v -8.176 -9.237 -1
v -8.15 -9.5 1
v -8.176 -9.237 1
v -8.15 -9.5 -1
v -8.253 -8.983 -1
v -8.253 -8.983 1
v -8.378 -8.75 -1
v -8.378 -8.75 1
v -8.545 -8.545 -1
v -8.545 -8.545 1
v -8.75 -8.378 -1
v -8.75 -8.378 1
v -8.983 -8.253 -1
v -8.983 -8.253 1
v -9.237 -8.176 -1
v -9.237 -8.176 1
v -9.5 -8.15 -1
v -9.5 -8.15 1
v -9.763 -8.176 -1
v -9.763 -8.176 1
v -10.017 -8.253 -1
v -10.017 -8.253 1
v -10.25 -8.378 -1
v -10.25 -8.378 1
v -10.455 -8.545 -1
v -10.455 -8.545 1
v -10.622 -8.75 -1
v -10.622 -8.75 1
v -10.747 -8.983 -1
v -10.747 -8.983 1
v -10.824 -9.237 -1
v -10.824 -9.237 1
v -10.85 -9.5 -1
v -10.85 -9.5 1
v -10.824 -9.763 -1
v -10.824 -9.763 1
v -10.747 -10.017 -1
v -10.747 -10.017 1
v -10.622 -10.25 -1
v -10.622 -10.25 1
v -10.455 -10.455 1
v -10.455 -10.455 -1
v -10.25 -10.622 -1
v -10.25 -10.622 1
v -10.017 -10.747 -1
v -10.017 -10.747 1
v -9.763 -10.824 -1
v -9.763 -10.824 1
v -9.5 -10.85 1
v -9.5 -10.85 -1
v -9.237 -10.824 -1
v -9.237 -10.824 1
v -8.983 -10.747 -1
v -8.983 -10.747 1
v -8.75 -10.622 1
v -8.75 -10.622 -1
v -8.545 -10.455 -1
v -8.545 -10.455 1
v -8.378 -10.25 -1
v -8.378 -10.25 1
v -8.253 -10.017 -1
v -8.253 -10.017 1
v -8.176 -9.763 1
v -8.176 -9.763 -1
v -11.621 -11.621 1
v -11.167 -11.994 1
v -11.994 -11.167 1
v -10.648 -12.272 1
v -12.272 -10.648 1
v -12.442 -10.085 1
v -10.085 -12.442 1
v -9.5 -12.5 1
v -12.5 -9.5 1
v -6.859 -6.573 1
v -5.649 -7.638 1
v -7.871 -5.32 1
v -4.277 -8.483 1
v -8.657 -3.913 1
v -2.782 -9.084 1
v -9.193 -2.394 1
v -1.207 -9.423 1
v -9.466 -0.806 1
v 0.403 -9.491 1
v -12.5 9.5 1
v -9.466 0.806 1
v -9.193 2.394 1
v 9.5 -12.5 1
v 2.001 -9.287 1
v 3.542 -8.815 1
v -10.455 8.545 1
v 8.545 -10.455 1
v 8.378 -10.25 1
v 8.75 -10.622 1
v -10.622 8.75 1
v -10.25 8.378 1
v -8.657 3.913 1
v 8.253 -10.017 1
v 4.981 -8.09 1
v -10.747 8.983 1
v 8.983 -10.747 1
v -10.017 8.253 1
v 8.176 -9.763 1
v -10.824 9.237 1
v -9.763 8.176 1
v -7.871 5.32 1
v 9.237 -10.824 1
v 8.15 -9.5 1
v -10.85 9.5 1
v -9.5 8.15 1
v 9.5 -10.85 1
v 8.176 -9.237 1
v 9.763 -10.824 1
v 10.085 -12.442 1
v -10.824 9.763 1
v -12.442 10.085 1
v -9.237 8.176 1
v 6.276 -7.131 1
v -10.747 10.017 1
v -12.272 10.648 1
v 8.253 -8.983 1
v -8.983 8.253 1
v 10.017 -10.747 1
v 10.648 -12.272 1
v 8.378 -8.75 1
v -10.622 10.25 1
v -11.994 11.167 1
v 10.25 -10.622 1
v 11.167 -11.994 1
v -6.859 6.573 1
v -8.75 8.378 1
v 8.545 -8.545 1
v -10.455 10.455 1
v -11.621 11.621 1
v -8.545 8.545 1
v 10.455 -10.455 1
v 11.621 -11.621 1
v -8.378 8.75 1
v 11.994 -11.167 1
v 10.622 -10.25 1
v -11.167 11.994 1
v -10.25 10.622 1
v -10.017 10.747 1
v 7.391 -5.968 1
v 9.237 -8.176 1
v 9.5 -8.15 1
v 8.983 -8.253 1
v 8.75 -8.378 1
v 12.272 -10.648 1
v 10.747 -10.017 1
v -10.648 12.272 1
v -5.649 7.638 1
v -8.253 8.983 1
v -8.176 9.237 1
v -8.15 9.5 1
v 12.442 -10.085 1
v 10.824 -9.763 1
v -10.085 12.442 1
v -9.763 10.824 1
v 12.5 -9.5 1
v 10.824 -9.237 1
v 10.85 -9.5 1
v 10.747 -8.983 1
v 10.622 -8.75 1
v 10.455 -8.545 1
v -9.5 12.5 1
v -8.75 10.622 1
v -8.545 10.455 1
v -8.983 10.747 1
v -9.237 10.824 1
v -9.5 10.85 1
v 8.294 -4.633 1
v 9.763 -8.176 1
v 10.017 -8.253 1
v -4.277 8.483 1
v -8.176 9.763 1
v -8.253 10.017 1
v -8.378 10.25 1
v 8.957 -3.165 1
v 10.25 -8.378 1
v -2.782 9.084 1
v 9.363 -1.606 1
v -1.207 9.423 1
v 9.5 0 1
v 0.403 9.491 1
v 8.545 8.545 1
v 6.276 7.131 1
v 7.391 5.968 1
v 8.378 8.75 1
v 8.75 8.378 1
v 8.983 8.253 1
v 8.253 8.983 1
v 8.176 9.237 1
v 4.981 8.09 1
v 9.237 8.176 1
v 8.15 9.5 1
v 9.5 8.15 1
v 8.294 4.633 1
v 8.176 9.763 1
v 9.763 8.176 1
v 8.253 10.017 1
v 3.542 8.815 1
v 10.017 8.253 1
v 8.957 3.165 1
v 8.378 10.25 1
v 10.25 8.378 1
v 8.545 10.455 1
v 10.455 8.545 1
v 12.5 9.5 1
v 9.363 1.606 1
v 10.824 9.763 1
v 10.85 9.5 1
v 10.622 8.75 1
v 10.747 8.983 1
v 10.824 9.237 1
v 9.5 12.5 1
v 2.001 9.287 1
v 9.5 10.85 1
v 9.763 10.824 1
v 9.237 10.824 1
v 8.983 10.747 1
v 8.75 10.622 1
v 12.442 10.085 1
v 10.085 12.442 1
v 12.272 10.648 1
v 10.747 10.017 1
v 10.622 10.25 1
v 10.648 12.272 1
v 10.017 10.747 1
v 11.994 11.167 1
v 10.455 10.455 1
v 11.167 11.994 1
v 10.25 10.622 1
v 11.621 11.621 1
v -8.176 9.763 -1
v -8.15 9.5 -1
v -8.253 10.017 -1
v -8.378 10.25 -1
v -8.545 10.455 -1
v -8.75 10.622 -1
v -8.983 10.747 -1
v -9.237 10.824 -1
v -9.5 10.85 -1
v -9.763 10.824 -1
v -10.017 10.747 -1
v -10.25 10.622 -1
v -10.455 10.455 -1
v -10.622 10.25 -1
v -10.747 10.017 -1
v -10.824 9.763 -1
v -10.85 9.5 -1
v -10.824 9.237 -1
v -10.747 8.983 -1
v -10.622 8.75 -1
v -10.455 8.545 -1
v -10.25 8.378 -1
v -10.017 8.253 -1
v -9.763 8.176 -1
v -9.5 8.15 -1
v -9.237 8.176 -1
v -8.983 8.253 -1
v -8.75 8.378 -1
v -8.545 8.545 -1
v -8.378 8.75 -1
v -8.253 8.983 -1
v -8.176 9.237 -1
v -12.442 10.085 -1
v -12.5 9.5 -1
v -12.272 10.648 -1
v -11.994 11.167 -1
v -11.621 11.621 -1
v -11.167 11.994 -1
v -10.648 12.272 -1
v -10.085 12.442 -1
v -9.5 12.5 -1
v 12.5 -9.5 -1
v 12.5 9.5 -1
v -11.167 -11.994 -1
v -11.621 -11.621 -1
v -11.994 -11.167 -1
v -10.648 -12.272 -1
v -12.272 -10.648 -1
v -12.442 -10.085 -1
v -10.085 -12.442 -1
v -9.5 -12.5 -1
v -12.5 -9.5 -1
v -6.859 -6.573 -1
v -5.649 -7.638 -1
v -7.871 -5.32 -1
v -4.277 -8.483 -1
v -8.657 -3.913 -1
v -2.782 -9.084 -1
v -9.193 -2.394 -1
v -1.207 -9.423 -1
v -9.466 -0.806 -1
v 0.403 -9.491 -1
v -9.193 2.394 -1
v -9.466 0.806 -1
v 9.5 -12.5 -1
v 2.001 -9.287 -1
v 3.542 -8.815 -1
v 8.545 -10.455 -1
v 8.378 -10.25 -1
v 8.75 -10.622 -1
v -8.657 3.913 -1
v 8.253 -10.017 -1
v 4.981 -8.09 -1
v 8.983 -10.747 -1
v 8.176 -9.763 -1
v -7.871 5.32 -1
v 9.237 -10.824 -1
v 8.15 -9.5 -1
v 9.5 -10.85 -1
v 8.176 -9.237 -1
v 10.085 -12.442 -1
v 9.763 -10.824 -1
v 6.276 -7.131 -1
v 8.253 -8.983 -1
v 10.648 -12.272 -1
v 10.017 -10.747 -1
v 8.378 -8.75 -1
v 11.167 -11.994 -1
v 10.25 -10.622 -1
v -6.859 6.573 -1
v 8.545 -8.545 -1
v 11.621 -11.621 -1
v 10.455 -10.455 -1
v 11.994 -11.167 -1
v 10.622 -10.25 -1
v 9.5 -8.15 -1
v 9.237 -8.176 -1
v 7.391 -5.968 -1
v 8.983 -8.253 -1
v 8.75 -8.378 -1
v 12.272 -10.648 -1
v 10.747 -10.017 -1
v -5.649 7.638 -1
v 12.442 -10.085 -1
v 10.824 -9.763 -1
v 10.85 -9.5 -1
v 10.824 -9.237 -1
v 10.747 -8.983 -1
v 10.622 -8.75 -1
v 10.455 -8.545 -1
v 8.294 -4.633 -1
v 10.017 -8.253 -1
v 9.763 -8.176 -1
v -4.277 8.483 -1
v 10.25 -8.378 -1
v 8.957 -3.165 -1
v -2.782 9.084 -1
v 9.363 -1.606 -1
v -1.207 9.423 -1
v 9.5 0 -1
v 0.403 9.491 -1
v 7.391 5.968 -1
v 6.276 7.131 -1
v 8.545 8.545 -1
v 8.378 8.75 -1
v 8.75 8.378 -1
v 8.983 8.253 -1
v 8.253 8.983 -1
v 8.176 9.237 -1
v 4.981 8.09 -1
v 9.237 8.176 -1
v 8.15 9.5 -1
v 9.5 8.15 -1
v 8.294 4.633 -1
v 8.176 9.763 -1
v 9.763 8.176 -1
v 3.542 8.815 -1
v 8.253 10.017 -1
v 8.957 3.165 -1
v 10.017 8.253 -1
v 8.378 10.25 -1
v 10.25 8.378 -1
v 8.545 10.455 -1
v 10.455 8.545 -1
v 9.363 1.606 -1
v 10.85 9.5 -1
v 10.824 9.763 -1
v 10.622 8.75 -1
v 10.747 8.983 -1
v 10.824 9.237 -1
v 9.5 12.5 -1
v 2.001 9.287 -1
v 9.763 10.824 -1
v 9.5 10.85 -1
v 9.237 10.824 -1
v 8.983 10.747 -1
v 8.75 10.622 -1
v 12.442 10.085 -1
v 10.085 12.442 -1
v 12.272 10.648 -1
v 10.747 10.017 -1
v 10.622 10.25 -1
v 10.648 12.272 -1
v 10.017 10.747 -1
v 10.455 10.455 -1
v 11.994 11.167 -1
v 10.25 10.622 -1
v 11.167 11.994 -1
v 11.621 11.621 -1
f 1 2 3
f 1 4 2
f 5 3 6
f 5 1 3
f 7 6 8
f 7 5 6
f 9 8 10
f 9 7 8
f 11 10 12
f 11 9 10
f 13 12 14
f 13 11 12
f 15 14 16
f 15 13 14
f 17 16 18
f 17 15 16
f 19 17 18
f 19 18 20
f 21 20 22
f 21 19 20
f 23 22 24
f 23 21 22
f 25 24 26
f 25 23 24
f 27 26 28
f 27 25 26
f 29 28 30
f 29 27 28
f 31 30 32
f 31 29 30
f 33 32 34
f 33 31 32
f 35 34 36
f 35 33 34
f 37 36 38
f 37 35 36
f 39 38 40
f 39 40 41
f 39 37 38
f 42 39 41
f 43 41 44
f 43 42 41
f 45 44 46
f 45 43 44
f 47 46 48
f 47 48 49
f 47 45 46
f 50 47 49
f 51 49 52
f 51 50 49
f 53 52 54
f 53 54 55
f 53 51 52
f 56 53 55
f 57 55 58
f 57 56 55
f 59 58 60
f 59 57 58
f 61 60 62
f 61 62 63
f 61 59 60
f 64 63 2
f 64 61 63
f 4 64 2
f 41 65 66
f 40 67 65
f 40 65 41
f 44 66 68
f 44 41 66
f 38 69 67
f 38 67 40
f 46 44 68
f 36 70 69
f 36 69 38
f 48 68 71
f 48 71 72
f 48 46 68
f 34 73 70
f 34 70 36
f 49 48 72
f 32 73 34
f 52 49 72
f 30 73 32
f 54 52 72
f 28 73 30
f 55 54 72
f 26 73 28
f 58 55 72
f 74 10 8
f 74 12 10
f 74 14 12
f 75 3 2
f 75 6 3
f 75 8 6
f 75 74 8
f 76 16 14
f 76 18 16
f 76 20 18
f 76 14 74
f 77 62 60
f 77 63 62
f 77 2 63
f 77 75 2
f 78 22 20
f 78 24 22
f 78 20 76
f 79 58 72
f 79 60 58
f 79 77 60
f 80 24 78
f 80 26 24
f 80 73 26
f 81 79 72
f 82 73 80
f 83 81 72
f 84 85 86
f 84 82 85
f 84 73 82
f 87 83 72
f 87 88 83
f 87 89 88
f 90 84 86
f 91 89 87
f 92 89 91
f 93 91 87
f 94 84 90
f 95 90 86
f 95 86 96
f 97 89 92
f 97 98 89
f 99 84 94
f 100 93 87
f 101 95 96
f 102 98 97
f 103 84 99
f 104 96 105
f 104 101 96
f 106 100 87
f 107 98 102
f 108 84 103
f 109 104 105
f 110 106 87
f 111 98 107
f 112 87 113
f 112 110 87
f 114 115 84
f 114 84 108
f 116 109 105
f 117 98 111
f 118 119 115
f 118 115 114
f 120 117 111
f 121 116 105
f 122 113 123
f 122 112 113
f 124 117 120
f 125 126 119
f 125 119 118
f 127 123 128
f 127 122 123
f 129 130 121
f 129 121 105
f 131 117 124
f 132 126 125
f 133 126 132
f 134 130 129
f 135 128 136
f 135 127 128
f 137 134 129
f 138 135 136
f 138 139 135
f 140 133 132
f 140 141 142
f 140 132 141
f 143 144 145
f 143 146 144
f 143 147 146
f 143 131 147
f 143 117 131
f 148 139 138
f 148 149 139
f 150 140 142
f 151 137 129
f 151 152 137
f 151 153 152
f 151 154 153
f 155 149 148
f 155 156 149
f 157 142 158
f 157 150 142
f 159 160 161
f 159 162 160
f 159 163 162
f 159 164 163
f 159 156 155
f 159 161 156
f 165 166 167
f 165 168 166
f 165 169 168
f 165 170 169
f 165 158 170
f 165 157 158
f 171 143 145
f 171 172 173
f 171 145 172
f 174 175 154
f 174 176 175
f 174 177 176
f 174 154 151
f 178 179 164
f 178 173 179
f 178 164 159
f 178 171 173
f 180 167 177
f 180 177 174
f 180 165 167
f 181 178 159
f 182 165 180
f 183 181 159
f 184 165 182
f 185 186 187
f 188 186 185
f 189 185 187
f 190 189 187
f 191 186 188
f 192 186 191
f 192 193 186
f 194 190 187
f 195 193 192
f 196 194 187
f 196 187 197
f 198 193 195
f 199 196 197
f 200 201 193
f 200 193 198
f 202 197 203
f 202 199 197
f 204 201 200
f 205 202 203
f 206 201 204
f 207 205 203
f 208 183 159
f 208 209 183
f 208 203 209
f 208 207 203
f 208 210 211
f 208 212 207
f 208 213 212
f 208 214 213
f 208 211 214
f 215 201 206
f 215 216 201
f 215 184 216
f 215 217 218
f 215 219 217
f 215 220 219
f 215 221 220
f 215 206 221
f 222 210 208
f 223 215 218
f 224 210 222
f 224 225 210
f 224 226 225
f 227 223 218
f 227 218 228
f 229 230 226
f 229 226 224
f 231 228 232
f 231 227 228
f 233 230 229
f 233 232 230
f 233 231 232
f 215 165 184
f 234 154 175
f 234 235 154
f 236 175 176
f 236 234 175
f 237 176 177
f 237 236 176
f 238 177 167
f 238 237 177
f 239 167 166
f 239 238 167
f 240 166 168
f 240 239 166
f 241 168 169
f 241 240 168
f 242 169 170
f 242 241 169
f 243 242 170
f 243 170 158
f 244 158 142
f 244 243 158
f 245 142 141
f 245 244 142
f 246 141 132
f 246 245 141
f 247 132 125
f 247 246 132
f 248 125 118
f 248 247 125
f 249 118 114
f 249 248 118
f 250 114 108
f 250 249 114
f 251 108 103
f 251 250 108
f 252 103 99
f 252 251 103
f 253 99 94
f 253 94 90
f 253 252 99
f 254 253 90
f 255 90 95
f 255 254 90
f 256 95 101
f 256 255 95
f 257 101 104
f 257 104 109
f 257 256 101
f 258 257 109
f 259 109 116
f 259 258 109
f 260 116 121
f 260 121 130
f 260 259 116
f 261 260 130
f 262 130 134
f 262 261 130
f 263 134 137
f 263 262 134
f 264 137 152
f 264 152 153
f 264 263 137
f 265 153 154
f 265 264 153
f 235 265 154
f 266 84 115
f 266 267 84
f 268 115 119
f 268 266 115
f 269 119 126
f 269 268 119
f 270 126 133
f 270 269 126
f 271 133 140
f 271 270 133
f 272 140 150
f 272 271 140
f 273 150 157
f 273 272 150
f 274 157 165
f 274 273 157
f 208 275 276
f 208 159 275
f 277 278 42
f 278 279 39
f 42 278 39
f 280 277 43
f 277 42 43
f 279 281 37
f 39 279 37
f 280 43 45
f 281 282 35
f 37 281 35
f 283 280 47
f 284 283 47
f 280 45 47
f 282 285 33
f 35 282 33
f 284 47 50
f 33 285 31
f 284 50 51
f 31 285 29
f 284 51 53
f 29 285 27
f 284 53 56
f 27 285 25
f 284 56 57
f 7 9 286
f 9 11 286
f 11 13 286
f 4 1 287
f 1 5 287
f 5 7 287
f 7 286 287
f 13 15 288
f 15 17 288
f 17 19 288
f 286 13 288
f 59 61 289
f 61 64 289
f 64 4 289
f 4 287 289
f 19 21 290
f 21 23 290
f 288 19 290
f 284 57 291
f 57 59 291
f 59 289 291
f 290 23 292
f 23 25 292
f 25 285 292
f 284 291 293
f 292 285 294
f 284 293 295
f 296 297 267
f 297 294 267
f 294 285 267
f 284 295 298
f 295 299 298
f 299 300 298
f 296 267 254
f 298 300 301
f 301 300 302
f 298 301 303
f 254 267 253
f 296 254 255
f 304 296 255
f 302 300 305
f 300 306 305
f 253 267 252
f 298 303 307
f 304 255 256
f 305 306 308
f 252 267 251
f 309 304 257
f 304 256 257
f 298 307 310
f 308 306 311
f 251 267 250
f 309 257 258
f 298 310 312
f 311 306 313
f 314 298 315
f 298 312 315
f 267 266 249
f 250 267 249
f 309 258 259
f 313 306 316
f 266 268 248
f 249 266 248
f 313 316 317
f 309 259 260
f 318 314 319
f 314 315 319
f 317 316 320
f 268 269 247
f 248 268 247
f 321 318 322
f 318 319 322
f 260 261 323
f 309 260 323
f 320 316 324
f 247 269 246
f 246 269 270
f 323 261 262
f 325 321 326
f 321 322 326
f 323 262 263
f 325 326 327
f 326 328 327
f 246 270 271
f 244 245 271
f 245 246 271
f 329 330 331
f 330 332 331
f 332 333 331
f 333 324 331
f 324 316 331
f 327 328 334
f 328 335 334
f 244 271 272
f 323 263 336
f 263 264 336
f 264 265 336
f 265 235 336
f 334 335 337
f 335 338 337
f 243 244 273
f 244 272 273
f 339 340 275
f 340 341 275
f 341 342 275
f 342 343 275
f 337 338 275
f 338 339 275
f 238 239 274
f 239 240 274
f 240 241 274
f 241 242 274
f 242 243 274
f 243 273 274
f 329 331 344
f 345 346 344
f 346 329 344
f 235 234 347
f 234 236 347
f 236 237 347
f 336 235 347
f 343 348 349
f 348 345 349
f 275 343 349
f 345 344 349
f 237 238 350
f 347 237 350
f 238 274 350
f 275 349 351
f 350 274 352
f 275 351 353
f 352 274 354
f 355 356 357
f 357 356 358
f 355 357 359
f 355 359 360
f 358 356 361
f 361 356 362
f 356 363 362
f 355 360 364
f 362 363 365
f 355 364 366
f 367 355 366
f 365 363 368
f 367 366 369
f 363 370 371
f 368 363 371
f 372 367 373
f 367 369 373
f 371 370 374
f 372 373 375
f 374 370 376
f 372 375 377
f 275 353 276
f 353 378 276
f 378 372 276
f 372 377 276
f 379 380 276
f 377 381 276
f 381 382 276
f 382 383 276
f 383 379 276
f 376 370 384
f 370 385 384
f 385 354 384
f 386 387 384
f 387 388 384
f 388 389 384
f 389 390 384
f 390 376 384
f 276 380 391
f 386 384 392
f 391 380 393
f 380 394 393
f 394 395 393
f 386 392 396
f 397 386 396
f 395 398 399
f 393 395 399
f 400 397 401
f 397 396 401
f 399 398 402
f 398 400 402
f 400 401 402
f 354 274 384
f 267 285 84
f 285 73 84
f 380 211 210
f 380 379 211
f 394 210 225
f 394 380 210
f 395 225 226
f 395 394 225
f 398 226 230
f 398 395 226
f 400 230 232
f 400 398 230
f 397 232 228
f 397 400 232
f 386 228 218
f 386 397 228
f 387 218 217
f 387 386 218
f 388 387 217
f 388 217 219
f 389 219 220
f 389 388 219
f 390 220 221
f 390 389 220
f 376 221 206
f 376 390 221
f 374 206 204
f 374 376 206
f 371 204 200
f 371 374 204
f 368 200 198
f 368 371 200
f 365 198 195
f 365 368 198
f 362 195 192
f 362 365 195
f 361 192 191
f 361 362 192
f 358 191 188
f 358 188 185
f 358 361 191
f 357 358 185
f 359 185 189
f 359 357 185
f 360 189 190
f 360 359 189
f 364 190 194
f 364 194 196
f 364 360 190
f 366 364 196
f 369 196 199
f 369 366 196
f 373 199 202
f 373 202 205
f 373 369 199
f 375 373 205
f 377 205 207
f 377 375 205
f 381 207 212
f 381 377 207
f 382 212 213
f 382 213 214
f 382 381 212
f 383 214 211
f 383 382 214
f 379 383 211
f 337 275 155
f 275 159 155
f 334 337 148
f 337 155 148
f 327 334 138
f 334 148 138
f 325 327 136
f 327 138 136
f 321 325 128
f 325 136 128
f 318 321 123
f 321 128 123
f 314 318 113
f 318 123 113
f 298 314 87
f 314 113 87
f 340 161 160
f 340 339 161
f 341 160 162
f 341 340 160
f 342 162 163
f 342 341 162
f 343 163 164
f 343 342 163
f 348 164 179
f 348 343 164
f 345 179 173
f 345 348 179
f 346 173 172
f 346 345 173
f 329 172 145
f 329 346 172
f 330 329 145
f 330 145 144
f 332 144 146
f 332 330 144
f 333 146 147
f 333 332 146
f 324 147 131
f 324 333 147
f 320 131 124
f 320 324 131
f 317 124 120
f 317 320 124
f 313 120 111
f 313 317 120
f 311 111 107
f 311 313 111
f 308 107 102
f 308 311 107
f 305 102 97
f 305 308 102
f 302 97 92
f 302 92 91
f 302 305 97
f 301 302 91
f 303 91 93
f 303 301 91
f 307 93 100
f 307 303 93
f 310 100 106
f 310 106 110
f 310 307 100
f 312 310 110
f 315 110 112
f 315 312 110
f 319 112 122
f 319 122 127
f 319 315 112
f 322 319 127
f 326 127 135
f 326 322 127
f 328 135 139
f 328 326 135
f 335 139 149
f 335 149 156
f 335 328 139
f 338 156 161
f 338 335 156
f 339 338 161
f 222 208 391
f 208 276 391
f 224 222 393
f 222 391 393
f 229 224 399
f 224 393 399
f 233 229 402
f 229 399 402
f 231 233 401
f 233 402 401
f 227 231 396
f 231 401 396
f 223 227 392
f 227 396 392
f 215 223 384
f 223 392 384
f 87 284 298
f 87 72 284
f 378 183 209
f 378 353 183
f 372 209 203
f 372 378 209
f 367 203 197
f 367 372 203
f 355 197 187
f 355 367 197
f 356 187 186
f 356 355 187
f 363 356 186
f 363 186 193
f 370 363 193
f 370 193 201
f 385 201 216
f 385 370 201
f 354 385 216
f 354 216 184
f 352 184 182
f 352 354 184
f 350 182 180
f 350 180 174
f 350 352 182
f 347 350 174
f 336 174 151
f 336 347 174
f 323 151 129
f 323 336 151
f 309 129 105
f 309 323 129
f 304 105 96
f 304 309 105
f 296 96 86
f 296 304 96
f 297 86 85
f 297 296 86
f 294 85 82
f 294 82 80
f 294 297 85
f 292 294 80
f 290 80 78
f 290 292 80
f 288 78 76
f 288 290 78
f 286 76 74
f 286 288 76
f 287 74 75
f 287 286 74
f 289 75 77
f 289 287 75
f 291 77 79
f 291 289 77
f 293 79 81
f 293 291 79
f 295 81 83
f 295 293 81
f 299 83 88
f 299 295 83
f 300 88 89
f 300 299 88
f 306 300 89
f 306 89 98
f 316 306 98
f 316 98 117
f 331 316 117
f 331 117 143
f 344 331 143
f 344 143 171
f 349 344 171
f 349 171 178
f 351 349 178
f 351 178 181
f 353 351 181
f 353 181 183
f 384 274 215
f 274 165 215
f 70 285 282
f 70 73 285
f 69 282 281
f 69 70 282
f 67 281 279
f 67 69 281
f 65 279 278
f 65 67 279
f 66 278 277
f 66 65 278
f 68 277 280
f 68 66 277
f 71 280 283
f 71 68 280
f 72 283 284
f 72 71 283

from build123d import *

# Parameters (mm, degrees)
SKETCH1_W           = 25
SKETCH1_H           = 25
SKETCH1_R           = 1.35
SKETCH1_R_2         = 9.5
BOSS_EXTRUDE1_DEPTH = 1
FILLET1_R           = 3


with BuildPart() as part:
    # Sketch1 → Boss-Extrude1 (new, symmetric)
    with BuildSketch(Plane.XY):
        Rectangle(SKETCH1_W, SKETCH1_H)
        with Locations((-9.5, 9.5)):
            Circle(SKETCH1_R, mode=Mode.SUBTRACT)
        with Locations((9.5, 9.5)):
            Circle(SKETCH1_R, mode=Mode.SUBTRACT)
        with Locations((9.5, -9.5)):
            Circle(SKETCH1_R, mode=Mode.SUBTRACT)
        with Locations((-9.5, -9.5)):
            Circle(SKETCH1_R, mode=Mode.SUBTRACT)
        Circle(SKETCH1_R_2, mode=Mode.SUBTRACT)
    extrude(amount=BOSS_EXTRUDE1_DEPTH, both=True)

    # Fillet1
    fillet1_edges = [part.edges().sort_by_distance(p)[0] for p in [
        (12.5, -12.5, 0),
        (-12.5, -12.5, 0),
        (-12.5, 12.5, 0),
        (12.5, 12.5, 0),
    ]]
    fillet(fillet1_edges, radius=FILLET1_R)


solid = part.part
